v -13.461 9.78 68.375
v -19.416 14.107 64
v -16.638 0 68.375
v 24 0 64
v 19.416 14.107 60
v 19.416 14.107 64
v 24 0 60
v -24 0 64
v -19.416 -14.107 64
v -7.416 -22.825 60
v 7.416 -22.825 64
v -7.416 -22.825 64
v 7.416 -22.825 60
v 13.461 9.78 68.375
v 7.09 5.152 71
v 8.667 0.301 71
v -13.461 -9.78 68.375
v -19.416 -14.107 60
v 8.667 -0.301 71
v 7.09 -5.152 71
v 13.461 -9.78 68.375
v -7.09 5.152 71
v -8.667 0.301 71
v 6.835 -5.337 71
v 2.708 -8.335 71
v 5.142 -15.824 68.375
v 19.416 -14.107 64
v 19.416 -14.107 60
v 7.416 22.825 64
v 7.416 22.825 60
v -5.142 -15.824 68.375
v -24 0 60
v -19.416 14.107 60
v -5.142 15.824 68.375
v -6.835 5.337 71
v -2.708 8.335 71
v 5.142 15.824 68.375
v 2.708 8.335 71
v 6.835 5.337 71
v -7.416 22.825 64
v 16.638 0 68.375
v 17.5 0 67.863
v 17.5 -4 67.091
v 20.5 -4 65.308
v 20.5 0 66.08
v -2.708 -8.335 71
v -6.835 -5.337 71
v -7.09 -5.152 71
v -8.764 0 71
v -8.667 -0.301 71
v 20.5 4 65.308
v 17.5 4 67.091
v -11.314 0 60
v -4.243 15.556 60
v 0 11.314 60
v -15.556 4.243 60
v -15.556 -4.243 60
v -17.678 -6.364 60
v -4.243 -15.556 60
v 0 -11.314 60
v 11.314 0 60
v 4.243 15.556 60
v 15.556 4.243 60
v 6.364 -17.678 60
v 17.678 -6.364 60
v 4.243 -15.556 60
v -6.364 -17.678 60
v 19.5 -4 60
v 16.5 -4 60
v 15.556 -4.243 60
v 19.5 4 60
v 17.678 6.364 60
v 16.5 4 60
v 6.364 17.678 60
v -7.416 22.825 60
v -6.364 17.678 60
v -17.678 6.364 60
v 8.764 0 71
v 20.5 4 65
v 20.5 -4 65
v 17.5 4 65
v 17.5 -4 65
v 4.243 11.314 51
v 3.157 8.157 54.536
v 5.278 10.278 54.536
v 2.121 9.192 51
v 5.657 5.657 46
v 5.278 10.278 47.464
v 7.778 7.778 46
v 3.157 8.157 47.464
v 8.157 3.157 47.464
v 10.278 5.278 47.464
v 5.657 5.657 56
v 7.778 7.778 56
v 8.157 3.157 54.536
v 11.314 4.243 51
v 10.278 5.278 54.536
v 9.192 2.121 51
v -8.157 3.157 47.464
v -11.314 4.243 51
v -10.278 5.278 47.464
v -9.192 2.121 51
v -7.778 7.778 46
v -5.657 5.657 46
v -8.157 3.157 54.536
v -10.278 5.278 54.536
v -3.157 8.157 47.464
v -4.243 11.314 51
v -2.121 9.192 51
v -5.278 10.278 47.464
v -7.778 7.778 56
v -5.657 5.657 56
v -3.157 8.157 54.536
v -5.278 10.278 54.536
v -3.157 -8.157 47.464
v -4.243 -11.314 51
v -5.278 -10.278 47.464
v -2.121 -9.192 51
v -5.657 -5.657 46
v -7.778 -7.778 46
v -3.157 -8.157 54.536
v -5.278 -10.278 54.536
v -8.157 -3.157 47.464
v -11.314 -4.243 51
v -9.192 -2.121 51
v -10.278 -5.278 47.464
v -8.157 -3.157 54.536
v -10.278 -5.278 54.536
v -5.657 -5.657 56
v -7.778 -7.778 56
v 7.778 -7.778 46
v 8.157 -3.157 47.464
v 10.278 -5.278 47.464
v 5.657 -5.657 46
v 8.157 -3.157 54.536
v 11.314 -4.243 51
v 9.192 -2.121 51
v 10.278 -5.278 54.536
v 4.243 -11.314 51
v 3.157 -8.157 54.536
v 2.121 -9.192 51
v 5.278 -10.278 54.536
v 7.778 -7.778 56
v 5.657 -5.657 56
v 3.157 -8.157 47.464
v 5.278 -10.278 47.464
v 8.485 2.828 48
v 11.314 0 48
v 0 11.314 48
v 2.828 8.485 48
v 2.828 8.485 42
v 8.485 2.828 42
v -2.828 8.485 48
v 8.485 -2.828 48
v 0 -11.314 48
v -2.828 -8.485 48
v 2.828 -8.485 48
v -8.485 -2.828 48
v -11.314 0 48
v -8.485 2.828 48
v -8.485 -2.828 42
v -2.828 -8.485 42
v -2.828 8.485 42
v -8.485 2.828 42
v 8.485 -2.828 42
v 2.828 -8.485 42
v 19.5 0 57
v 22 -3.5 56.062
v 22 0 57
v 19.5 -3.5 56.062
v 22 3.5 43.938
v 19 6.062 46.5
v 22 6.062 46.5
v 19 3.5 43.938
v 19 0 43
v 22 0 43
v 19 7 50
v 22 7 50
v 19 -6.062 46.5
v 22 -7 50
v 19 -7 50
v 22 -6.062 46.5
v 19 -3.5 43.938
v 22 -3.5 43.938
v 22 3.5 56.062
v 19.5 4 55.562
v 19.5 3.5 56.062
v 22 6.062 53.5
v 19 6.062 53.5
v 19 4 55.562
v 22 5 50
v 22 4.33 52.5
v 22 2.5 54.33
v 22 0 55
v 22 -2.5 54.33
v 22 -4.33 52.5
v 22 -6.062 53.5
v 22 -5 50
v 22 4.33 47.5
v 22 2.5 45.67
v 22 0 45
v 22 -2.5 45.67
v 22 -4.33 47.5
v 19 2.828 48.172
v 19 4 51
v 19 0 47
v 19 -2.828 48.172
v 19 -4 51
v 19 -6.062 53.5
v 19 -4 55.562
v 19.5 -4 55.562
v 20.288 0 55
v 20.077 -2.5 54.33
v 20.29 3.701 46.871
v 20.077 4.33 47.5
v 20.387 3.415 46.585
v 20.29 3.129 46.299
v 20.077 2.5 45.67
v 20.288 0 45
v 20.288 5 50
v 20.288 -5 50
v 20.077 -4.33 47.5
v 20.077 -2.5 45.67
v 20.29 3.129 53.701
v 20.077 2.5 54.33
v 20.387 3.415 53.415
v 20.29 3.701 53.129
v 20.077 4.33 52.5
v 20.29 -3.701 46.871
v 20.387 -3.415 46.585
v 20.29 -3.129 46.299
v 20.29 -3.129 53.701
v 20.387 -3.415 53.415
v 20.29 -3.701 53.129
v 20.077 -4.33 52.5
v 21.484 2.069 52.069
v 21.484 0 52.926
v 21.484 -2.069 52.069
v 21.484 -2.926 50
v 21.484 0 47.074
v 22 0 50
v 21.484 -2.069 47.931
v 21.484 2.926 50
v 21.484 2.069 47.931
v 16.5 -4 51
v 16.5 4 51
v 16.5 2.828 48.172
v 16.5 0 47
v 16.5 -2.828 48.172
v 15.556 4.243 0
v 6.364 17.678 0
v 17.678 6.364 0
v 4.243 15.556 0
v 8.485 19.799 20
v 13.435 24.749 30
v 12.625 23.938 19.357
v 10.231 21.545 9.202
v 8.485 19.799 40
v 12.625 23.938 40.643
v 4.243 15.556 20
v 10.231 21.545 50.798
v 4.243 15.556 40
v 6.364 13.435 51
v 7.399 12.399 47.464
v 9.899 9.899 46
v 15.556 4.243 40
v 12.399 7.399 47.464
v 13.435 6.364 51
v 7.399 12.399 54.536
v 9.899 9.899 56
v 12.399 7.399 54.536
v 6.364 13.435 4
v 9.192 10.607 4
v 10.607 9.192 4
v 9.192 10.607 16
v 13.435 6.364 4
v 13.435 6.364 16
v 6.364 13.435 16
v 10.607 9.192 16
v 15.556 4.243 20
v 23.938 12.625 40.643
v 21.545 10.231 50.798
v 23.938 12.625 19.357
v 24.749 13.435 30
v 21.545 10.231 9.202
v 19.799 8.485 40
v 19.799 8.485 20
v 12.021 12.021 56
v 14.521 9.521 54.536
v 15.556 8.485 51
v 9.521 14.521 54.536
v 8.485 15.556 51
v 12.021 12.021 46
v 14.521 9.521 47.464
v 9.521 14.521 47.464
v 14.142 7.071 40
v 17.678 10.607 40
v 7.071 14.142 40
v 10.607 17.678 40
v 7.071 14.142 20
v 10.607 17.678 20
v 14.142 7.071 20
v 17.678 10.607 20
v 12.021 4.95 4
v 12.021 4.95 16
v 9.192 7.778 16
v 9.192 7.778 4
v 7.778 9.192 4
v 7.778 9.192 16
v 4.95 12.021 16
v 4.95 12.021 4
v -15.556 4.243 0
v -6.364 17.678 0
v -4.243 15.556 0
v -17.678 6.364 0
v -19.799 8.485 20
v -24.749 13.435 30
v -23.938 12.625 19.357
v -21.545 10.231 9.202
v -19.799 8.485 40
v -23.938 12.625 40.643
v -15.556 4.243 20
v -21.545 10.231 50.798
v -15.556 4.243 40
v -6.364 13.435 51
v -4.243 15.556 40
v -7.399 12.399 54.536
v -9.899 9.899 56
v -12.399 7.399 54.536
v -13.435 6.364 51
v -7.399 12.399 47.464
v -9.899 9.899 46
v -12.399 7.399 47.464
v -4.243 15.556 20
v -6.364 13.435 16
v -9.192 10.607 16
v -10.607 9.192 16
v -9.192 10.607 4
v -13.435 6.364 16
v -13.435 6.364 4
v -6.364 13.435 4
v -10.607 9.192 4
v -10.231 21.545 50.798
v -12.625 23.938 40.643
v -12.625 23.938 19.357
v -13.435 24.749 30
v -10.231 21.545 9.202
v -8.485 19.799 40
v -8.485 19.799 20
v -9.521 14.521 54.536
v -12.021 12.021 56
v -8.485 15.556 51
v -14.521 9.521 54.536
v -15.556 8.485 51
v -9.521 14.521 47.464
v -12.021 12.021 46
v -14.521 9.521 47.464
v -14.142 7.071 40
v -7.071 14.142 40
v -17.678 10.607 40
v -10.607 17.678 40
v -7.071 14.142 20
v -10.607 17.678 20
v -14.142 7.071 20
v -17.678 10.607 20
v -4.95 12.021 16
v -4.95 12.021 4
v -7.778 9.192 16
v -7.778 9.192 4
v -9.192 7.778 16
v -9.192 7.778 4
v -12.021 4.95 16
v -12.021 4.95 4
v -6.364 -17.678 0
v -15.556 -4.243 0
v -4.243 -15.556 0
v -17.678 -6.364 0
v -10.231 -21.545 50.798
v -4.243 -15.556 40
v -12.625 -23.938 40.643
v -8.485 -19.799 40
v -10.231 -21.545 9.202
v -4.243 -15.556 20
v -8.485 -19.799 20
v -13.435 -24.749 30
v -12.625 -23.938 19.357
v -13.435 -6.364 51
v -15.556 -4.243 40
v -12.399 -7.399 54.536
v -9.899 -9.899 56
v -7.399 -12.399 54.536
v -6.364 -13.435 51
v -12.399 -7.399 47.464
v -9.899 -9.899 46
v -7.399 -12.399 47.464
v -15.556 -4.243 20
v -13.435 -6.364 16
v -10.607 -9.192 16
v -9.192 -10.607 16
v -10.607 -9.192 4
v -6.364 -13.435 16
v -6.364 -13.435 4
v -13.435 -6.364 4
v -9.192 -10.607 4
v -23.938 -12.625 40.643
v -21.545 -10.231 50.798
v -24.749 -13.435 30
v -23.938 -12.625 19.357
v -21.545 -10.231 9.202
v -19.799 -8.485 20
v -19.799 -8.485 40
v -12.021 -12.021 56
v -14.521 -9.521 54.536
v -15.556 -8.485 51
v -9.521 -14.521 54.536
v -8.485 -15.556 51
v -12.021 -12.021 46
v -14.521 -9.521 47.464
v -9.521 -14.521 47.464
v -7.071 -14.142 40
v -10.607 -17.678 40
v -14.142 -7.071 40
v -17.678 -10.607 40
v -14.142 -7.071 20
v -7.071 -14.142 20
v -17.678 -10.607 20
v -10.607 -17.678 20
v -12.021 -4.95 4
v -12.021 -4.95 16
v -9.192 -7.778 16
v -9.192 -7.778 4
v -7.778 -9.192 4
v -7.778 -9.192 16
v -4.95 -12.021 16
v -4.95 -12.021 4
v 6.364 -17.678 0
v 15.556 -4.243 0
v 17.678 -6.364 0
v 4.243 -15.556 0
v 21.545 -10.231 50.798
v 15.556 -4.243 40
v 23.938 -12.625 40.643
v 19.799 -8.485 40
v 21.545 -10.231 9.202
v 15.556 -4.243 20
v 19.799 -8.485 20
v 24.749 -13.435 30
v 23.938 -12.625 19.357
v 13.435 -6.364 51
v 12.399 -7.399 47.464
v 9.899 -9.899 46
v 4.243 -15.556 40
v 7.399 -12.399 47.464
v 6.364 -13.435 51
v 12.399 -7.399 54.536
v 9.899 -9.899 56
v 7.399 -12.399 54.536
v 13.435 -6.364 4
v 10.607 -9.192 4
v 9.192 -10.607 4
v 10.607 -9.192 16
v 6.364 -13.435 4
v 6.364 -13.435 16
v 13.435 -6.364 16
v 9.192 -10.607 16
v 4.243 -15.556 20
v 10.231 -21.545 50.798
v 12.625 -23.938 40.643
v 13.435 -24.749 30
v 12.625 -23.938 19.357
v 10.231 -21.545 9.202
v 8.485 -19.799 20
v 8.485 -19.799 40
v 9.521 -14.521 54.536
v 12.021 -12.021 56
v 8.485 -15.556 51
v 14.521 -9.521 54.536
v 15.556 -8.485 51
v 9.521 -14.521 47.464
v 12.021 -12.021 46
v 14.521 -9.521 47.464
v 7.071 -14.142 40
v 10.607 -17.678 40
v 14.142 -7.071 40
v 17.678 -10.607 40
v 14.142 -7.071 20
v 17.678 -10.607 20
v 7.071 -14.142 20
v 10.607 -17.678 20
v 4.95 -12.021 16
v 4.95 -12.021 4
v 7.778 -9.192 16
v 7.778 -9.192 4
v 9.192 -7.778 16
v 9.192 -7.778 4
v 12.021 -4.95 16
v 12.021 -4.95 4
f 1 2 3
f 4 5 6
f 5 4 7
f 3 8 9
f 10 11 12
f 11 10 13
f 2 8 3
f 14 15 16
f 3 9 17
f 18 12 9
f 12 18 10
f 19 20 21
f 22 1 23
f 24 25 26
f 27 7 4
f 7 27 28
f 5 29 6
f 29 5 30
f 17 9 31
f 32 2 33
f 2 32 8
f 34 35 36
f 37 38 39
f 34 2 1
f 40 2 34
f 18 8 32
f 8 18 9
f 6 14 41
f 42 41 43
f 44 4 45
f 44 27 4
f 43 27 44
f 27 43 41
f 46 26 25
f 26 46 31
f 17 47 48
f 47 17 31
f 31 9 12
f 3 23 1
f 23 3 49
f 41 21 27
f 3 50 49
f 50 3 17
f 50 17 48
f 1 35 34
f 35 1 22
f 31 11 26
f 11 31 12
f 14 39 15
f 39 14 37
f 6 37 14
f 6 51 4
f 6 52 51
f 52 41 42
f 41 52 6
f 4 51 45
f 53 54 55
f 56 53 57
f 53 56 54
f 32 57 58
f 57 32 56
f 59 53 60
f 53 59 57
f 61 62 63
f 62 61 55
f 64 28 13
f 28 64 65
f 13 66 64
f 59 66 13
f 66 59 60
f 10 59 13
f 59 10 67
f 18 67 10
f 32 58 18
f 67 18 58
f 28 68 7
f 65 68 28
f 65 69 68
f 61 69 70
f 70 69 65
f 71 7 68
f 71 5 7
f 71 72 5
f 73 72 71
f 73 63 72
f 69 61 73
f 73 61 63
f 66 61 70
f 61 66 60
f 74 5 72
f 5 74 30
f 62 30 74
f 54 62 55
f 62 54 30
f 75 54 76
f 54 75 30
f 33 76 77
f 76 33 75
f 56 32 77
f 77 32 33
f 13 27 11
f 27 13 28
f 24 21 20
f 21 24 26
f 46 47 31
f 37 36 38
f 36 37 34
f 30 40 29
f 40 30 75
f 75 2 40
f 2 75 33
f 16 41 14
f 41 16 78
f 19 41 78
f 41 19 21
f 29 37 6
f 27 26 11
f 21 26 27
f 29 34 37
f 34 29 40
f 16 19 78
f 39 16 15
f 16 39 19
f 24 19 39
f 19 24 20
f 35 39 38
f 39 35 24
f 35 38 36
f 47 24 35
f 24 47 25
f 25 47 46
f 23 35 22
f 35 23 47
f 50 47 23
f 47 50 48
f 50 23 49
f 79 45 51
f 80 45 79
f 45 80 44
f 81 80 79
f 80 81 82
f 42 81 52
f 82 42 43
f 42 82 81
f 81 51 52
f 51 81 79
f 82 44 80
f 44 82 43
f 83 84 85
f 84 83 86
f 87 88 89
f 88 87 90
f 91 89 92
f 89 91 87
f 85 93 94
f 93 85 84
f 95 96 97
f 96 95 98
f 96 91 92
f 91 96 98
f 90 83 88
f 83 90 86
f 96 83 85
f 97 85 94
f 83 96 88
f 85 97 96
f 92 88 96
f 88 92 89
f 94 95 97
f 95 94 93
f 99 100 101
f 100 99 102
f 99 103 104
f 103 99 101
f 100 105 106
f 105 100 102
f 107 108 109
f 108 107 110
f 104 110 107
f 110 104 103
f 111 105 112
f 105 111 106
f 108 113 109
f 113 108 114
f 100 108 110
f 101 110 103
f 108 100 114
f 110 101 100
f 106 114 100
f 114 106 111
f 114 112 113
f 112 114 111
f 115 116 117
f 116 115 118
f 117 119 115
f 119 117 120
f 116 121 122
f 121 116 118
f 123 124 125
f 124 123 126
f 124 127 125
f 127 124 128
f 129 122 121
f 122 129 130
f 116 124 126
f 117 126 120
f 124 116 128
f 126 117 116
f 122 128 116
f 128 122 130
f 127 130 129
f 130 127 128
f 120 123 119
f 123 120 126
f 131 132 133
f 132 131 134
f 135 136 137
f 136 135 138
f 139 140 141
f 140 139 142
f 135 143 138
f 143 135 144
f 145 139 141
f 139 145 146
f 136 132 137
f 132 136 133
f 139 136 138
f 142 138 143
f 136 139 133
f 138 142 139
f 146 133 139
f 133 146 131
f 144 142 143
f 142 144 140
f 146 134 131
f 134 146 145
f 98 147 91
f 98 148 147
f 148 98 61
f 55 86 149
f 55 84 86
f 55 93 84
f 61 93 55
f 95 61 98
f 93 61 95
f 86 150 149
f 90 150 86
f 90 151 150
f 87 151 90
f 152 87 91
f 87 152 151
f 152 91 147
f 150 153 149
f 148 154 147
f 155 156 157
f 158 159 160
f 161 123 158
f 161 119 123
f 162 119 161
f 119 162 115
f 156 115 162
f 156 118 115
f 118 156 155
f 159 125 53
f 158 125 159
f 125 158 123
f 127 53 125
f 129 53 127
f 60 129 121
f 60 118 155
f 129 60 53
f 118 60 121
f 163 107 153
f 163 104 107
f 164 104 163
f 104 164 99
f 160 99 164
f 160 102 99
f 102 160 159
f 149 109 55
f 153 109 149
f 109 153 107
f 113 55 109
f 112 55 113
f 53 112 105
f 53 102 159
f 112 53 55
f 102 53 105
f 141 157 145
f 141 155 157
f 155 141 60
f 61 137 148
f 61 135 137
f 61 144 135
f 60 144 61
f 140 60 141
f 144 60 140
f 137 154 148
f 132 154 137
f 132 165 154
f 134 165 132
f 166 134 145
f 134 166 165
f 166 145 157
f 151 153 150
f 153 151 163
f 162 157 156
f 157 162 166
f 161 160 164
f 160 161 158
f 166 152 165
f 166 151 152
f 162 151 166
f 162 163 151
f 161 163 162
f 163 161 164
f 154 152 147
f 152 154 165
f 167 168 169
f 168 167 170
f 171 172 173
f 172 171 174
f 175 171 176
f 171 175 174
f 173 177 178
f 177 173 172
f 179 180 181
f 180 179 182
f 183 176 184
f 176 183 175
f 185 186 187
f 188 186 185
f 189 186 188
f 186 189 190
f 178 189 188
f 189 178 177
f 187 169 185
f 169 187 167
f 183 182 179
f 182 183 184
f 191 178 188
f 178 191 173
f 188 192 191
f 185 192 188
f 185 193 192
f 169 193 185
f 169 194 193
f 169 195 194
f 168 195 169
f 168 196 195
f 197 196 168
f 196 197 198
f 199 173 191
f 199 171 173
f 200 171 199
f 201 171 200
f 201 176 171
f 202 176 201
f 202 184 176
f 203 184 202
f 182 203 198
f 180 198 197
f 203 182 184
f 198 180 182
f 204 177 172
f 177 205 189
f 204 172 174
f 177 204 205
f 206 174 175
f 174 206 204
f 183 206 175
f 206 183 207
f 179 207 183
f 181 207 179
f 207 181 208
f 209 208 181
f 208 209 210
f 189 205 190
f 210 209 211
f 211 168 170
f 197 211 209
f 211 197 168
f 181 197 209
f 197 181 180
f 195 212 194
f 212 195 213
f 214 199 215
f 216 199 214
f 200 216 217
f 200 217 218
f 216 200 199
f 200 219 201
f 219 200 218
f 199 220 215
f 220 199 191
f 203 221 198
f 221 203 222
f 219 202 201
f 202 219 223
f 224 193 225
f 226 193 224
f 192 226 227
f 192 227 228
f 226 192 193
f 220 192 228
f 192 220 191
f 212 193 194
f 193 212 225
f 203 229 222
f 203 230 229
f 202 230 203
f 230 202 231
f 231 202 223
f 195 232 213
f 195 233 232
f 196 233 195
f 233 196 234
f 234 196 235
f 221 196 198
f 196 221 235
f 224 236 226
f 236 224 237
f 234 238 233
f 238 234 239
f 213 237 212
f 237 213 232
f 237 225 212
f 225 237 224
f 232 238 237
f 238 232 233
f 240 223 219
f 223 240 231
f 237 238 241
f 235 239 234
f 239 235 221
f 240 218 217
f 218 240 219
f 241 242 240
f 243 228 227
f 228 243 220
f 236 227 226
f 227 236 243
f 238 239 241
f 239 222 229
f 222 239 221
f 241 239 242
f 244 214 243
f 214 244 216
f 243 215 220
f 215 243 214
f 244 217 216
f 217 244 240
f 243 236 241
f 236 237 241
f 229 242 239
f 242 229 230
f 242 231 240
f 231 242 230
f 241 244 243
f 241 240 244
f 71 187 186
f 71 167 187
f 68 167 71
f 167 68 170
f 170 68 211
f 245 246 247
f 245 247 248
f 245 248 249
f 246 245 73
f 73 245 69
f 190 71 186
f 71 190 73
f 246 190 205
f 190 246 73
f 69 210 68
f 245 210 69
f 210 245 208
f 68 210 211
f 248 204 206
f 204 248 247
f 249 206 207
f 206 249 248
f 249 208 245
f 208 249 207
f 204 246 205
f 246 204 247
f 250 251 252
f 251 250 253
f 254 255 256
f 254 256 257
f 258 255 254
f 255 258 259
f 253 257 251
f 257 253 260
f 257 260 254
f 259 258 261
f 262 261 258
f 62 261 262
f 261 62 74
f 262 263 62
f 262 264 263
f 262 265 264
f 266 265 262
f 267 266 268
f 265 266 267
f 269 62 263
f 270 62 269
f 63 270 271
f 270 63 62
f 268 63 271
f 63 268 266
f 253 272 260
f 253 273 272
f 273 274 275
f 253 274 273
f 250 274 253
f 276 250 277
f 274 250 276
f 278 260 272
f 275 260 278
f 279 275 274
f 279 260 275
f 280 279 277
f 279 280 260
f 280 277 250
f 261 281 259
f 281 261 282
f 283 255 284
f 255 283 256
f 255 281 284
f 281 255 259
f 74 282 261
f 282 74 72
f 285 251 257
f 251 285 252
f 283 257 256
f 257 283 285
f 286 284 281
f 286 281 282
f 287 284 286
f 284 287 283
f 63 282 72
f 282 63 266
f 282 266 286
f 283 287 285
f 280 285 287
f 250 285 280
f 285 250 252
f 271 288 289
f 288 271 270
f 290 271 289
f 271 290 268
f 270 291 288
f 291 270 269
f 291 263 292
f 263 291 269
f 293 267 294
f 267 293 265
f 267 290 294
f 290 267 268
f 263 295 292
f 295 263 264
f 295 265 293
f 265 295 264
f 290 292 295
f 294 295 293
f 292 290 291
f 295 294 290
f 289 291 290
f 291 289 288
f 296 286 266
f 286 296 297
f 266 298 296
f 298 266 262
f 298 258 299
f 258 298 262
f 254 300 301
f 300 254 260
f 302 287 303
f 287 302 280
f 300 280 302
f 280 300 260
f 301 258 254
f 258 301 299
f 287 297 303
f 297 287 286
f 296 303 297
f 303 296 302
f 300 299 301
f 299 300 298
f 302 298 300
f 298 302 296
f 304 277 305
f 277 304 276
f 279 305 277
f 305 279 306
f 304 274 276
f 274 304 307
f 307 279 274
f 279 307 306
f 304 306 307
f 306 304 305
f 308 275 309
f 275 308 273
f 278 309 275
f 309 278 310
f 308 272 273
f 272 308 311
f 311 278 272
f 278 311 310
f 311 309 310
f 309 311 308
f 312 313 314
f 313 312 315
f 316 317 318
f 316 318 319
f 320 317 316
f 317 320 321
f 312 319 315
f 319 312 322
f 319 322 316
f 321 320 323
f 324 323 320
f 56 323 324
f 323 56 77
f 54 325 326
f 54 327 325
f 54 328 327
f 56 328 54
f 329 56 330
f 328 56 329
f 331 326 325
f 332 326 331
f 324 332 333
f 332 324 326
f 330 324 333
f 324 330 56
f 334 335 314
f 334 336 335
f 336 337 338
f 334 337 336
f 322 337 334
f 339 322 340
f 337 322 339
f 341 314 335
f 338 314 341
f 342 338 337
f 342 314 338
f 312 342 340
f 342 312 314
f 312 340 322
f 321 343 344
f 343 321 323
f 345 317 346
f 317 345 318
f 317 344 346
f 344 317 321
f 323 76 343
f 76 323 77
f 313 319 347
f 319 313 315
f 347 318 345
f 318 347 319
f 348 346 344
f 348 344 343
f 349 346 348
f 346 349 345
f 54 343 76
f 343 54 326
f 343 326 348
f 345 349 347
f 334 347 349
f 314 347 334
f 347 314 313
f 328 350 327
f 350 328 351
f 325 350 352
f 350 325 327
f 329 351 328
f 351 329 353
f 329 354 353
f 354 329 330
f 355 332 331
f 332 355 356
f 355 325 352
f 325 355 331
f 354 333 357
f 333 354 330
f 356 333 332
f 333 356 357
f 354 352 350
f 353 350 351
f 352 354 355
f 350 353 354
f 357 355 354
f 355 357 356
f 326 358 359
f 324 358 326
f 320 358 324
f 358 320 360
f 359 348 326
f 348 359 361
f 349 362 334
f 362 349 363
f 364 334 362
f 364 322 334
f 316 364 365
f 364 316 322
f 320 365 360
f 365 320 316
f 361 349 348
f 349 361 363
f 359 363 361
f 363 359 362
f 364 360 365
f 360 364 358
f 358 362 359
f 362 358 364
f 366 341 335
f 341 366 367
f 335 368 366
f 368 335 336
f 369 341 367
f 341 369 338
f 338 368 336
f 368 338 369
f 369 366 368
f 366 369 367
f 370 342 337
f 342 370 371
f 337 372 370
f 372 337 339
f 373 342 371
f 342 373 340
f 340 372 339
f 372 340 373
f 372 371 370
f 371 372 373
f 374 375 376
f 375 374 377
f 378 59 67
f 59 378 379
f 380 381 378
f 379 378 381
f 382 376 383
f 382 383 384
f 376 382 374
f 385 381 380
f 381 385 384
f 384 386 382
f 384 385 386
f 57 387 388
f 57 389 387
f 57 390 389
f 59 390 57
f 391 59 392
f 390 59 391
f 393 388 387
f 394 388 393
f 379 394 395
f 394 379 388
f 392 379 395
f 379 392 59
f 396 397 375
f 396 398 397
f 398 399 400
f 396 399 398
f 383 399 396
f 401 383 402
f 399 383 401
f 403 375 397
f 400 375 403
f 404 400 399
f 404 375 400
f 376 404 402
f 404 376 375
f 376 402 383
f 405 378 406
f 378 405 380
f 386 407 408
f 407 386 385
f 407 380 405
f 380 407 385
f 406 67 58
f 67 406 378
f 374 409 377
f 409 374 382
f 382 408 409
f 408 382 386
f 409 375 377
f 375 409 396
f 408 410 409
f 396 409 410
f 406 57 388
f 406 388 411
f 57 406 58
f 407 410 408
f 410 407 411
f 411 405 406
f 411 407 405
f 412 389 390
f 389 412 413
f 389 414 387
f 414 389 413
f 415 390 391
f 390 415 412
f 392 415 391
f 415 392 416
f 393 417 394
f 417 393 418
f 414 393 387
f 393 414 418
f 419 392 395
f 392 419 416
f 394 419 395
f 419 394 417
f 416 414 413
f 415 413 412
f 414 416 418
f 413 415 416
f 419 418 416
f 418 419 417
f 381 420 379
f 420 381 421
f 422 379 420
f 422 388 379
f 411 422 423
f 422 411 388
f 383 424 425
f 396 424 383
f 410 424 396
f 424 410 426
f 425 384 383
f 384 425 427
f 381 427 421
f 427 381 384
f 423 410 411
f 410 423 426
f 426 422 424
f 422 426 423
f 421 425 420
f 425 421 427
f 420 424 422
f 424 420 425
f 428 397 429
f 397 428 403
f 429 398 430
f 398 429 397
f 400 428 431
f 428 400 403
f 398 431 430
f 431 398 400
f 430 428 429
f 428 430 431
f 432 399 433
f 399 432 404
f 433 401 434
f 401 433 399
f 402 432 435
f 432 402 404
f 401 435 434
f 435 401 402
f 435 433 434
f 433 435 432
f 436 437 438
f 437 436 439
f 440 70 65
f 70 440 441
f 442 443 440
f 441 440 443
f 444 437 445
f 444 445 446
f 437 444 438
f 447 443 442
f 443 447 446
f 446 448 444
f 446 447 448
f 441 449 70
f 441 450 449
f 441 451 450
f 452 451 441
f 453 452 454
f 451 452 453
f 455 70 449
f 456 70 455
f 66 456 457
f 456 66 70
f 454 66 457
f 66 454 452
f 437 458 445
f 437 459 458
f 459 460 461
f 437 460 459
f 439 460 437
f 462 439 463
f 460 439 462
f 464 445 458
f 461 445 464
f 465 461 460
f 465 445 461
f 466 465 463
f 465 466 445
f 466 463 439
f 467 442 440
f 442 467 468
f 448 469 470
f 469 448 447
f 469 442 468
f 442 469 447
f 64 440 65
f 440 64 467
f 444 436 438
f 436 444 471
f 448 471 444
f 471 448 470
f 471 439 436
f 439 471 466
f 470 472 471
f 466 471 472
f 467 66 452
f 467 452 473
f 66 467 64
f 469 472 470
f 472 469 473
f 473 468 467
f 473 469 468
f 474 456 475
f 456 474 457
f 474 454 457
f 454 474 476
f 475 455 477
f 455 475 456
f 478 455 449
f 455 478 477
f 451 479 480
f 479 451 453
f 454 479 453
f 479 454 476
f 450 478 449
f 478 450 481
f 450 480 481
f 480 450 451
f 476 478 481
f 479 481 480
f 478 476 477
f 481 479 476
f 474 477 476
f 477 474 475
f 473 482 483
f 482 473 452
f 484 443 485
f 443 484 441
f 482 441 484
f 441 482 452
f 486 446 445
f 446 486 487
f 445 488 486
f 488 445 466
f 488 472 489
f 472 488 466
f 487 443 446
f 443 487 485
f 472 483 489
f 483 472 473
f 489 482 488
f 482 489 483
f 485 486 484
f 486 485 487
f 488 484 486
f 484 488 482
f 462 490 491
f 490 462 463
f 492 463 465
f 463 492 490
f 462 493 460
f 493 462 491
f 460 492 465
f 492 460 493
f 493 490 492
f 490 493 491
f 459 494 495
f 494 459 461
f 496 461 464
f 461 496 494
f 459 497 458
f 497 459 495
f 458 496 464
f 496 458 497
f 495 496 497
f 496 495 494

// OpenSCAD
// file: ../../lasercraft/utils.scad
// utils functions #######################

// piece id tester #######################

function tstid(id) = (ext_id == -1 || ext_id == id)? true : false;

// gizmo #################################

module gizmo() {
  color("yellow") cube(1,true);
  color("red") translate([5,0,0]) cube(1,true);
  color("green") translate([0,5,0]) cube(1,true);
  color("blue") translate([0,0,5]) cube(1,true);
}

// polygon slice #########################

module slice(points,thickness) {
  translate([0,0,-1]) linear_extrude(thickness) polygon(points);
}

// ring ##################################

module ring(ext,int,h,n) {
  difference() {
    cylinder(h,d=ext,$fn=n,center=false);
    translate([0,0,-0.5]) cylinder(h+1,d=int,$fn=n,center=false);
  }
}

// mirror path ###########################

function mirror_x(path) = concat(path,[for (i = [len(path)-1:-1:0]) [-1*path[i][0],path[i][1]]]);

function mirror_y(path) = concat(path,[for (i = [len(path)-1:-1:0]) [path[i][0],-1*path[i][1]]]);

function mirror_xy(path) = mirror_x(mirror_y(path));

function mirror_yx(path) = mirror_y(mirror_x(path));

// math functions ########################

// distance between 2 vectors
function dist_2v(v1,v2) = let (x = v2[0]-v1[0],y = v2[1]-v1[1]) sqrt(x*x+y*y);

// angle of a segment
function ang_2v(v1,v2) = let (x = v2[0]-v1[0],y = v2[1]-v1[1]) atan(y/x);

// arc functions #########################

// arc from 2 points and 1 height
function arc_2p1h(p1,p2,h,n) =
  let (
    ah = abs(h), s = (h/abs(h)),
    w = dist_2v(p1,p2)/2,hyp = sqrt(ah*ah+w*w),r = (hyp/2)/(ah/hyp),
    dev_ang = (abs(ang_2v(p1,p2))+((p1[0]>p2[0])? 90 : 0))*((p1[1]>p2[1])? -1 : 1),
    sh = s*((ah<w)? -1 : 1)*sqrt(r*r-w*w),
    //
    m = [(p2[0]-p1[0])/2+p1[0],(p2[1]-p1[1])/2+p1[1]],
    c = [cos(dev_ang+90)*sh+m[0],sin(dev_ang+90)*sh+m[1]],
    //
    start_ang = 180+((sh >= 0)? 1 : -1)*abs(acos(w/r))+dev_ang,
    end_ang = ((sh >= 0)? -1 : 1)*abs(acos(w/r))+dev_ang,
    //
    ang = abs(end_ang-start_ang)
    //
  )
  concat(
    [p1],
    [c],[[w,sh]],
    [[dev_ang,ang]],[[start_ang,end_ang]],
    //
    [for (i=[1:n-1]) let (tmp = start_ang-(h/abs(h))*(ang/n)*i) [cos(tmp)*r+c[0],sin(tmp)*r+c[1]]],
    //
    [p2]
  );

// half arc from 2 points
function arc_h2p(p1,p2,n) =
  let ()
  concat(
    [p1],
    //
    //
    [p2]
  );

// arc from 2 points and 1 center
function arc_2p1c(p1,p2,c,s,n) =
  let(
    //
    r = dist_2v(c,p1)
    //
  )
  concat(
    [p1],
    //
    //
    [p2]
  );

// arc from 3 points
function arc_3p(p1,p2,p3,n) =
  let(
    //
    //
  )
  //
  //
  0;

// ortho demi arc
function demi_arc(h,w,n,o=[0,0]) =
  let (hyp = sqrt(h*h+w*w),r = (hyp/2) / (h/hyp),ang = (90-acos(h/hyp))*2)
  concat(
    [[o[0],h+o[1]]],
    [for (i=[1:n-1]) let (tmp = 90-(ang/n)*i) [cos(tmp)*r+o[0],sin(tmp)*r-(r-h)+o[1]]],
    [[w+o[0],o[1]]]
  );

// ortho arc
function arc(h,w,n,o=[0,0]) =
  let (hyp = sqrt(h*h+(w/2)*(w/2)),r = (hyp/2) / (h/hyp),ang = (90-acos(h/hyp))*4)
  concat(
    [[-(w/2)+o[0],o[1]]],
    [for (i=[1:n-1]) let (tmp = 90+(ang/2)-(ang/n)*i) [cos(tmp)*r+o[0],sin(tmp)*r-(r-h)+o[1]]],
    [[w/2+o[0],o[1]]]
  );

// TEST ZONE ########

/*
translate([5,10,0.5]) color("yellow") cube([1,1,1],center=true);
translate([10,5,0.5]) color("yellow") cube([1,1,1],center=true);
translate([7.5,7.5,0.5]) color("pink") cube([1,1,1],center=true);
translate([14.6,14.6,0.5]) color("turquoise") cube([1,1,1],center=true);
translate([0.4,0.4,0.5]) color("turquoise") cube([1,1,1],center=true);
translate([4.4,4.4,0.5]) color("blue") cube([1,1,1],center=true);
translate([10.5,10.5,0.5]) color("blue") cube([1,1,1],center=true);
//translate([9.8,9.8,0.5]) color("blue") cube([1,1,1],center=true);

//pts = arc_2p1h([5,10],[10,5],-10,5);
//echo(pts);
//polygon(pts);
pts = arc_2p1c([5,10],[10,5],[4.4,4.4],1,5);
//pts = arc_2p1c([5,10],[10,5],[10.5,10.5],1,5);
echo(pts);
polygon(pts);
//*/

//*
module test_arc_3p(p1,p2,p3,n) {
  translate([p1[0],p1[1],1]) color("blue") cube(1,center=true);
  translate([p2[0],p2[1],1]) color("blue") cube(1,center=true);
  translate([p3[0],p3[1],1]) color("pink") cube(1,center=true);
  pts = arc_3p(p1,p2,p3,n);
  echo(pts);
  //polygon(pts);
}

//test_arc_3p([5,10],[10,5],[10,10],5);
//*/
// main file
// infos ###########################

//nb pieces : 2

// includes ########################

include <../../lasercraft/utils.scad>;

// variables #######################

ext_id = -1;
all = (ext_id < 0)? true : false;
$fn = 12;

// functions #######################

module eye() {
  union() {
    rotate_extrude(angle=360,$fn=8)
    polygon(concat([[5.5,-1],[0,-1]],demi_arc(2,5.5,2)));
    translate([0,0,-1]) ring(14,10,3,12);
  }
}

module head() {
  union() {
    // hat
    difference() {
      translate([0,0,8])
      rotate_extrude(angle=360,$fn=10)
      polygon(concat([[24,-4],[0,-4]],demi_arc(8,24,3)));
      translate([0,0,15]) cylinder(3,d=20);
      translate([19,0,13]) cube([3,8,8],center=true);
    }
    // bloc
    rotate([0,0,45]) {
      // base
      cube(16,true);
      // neck
      translate([0,0,-14])
      linear_extrude(7)
      polygon([[4,8],[-4,8],[-8,4],[-8,-4],[-4,-8],[4,-8],[8,-4],[8,4]]);
      // connectors
      for (i= [0:3]) {
        rotate([0,0,90*i]) translate([7,0,-5]) rotate([0,90,0])
        cylinder(4,r=5,center=false,$fn=8);
      }
    }
    // eye
    translate([18,0,0]) cube([3,8,10],center=true);
    translate([18,0,-5]) rotate([0,90,0]) cylinder(3,d=8,center=true,$fn=8);
    translate([20,0,-6]) rotate([0,90,0]) eye();
  }
}

module leg() {
  union() {
    difference() {
      rotate([0,90,0]) translate([0,0,-8])
      linear_extrude(16) polygon(concat([[30,-3],[-30,-3]],arc(10,60,6)));
      translate([0,0,21]) rotate([90,0,0]) cylinder(4,r=5,center=false,$fn=8);
      translate([0,-1,0]) cube([17,8,20],center=true);
    }
    translate([0,1,0]) cube([10,6,22],center=true);
    translate([3,-3,-20]) cube([4,4,12],center=true);
    translate([-3,-3,-20]) cube([4,4,12],center=true);
  }
}

module legs() {
  for (i = [0:3]) { rotate([0,0,i*90-45]) translate([0,17,30]) leg(); } // 17->11
}

// composing #######################

if (tstid(0)) translate([0,0,56]) head();
if (tstid(1)) legs();

// zone de construction
//cube([200,200,1],true);
